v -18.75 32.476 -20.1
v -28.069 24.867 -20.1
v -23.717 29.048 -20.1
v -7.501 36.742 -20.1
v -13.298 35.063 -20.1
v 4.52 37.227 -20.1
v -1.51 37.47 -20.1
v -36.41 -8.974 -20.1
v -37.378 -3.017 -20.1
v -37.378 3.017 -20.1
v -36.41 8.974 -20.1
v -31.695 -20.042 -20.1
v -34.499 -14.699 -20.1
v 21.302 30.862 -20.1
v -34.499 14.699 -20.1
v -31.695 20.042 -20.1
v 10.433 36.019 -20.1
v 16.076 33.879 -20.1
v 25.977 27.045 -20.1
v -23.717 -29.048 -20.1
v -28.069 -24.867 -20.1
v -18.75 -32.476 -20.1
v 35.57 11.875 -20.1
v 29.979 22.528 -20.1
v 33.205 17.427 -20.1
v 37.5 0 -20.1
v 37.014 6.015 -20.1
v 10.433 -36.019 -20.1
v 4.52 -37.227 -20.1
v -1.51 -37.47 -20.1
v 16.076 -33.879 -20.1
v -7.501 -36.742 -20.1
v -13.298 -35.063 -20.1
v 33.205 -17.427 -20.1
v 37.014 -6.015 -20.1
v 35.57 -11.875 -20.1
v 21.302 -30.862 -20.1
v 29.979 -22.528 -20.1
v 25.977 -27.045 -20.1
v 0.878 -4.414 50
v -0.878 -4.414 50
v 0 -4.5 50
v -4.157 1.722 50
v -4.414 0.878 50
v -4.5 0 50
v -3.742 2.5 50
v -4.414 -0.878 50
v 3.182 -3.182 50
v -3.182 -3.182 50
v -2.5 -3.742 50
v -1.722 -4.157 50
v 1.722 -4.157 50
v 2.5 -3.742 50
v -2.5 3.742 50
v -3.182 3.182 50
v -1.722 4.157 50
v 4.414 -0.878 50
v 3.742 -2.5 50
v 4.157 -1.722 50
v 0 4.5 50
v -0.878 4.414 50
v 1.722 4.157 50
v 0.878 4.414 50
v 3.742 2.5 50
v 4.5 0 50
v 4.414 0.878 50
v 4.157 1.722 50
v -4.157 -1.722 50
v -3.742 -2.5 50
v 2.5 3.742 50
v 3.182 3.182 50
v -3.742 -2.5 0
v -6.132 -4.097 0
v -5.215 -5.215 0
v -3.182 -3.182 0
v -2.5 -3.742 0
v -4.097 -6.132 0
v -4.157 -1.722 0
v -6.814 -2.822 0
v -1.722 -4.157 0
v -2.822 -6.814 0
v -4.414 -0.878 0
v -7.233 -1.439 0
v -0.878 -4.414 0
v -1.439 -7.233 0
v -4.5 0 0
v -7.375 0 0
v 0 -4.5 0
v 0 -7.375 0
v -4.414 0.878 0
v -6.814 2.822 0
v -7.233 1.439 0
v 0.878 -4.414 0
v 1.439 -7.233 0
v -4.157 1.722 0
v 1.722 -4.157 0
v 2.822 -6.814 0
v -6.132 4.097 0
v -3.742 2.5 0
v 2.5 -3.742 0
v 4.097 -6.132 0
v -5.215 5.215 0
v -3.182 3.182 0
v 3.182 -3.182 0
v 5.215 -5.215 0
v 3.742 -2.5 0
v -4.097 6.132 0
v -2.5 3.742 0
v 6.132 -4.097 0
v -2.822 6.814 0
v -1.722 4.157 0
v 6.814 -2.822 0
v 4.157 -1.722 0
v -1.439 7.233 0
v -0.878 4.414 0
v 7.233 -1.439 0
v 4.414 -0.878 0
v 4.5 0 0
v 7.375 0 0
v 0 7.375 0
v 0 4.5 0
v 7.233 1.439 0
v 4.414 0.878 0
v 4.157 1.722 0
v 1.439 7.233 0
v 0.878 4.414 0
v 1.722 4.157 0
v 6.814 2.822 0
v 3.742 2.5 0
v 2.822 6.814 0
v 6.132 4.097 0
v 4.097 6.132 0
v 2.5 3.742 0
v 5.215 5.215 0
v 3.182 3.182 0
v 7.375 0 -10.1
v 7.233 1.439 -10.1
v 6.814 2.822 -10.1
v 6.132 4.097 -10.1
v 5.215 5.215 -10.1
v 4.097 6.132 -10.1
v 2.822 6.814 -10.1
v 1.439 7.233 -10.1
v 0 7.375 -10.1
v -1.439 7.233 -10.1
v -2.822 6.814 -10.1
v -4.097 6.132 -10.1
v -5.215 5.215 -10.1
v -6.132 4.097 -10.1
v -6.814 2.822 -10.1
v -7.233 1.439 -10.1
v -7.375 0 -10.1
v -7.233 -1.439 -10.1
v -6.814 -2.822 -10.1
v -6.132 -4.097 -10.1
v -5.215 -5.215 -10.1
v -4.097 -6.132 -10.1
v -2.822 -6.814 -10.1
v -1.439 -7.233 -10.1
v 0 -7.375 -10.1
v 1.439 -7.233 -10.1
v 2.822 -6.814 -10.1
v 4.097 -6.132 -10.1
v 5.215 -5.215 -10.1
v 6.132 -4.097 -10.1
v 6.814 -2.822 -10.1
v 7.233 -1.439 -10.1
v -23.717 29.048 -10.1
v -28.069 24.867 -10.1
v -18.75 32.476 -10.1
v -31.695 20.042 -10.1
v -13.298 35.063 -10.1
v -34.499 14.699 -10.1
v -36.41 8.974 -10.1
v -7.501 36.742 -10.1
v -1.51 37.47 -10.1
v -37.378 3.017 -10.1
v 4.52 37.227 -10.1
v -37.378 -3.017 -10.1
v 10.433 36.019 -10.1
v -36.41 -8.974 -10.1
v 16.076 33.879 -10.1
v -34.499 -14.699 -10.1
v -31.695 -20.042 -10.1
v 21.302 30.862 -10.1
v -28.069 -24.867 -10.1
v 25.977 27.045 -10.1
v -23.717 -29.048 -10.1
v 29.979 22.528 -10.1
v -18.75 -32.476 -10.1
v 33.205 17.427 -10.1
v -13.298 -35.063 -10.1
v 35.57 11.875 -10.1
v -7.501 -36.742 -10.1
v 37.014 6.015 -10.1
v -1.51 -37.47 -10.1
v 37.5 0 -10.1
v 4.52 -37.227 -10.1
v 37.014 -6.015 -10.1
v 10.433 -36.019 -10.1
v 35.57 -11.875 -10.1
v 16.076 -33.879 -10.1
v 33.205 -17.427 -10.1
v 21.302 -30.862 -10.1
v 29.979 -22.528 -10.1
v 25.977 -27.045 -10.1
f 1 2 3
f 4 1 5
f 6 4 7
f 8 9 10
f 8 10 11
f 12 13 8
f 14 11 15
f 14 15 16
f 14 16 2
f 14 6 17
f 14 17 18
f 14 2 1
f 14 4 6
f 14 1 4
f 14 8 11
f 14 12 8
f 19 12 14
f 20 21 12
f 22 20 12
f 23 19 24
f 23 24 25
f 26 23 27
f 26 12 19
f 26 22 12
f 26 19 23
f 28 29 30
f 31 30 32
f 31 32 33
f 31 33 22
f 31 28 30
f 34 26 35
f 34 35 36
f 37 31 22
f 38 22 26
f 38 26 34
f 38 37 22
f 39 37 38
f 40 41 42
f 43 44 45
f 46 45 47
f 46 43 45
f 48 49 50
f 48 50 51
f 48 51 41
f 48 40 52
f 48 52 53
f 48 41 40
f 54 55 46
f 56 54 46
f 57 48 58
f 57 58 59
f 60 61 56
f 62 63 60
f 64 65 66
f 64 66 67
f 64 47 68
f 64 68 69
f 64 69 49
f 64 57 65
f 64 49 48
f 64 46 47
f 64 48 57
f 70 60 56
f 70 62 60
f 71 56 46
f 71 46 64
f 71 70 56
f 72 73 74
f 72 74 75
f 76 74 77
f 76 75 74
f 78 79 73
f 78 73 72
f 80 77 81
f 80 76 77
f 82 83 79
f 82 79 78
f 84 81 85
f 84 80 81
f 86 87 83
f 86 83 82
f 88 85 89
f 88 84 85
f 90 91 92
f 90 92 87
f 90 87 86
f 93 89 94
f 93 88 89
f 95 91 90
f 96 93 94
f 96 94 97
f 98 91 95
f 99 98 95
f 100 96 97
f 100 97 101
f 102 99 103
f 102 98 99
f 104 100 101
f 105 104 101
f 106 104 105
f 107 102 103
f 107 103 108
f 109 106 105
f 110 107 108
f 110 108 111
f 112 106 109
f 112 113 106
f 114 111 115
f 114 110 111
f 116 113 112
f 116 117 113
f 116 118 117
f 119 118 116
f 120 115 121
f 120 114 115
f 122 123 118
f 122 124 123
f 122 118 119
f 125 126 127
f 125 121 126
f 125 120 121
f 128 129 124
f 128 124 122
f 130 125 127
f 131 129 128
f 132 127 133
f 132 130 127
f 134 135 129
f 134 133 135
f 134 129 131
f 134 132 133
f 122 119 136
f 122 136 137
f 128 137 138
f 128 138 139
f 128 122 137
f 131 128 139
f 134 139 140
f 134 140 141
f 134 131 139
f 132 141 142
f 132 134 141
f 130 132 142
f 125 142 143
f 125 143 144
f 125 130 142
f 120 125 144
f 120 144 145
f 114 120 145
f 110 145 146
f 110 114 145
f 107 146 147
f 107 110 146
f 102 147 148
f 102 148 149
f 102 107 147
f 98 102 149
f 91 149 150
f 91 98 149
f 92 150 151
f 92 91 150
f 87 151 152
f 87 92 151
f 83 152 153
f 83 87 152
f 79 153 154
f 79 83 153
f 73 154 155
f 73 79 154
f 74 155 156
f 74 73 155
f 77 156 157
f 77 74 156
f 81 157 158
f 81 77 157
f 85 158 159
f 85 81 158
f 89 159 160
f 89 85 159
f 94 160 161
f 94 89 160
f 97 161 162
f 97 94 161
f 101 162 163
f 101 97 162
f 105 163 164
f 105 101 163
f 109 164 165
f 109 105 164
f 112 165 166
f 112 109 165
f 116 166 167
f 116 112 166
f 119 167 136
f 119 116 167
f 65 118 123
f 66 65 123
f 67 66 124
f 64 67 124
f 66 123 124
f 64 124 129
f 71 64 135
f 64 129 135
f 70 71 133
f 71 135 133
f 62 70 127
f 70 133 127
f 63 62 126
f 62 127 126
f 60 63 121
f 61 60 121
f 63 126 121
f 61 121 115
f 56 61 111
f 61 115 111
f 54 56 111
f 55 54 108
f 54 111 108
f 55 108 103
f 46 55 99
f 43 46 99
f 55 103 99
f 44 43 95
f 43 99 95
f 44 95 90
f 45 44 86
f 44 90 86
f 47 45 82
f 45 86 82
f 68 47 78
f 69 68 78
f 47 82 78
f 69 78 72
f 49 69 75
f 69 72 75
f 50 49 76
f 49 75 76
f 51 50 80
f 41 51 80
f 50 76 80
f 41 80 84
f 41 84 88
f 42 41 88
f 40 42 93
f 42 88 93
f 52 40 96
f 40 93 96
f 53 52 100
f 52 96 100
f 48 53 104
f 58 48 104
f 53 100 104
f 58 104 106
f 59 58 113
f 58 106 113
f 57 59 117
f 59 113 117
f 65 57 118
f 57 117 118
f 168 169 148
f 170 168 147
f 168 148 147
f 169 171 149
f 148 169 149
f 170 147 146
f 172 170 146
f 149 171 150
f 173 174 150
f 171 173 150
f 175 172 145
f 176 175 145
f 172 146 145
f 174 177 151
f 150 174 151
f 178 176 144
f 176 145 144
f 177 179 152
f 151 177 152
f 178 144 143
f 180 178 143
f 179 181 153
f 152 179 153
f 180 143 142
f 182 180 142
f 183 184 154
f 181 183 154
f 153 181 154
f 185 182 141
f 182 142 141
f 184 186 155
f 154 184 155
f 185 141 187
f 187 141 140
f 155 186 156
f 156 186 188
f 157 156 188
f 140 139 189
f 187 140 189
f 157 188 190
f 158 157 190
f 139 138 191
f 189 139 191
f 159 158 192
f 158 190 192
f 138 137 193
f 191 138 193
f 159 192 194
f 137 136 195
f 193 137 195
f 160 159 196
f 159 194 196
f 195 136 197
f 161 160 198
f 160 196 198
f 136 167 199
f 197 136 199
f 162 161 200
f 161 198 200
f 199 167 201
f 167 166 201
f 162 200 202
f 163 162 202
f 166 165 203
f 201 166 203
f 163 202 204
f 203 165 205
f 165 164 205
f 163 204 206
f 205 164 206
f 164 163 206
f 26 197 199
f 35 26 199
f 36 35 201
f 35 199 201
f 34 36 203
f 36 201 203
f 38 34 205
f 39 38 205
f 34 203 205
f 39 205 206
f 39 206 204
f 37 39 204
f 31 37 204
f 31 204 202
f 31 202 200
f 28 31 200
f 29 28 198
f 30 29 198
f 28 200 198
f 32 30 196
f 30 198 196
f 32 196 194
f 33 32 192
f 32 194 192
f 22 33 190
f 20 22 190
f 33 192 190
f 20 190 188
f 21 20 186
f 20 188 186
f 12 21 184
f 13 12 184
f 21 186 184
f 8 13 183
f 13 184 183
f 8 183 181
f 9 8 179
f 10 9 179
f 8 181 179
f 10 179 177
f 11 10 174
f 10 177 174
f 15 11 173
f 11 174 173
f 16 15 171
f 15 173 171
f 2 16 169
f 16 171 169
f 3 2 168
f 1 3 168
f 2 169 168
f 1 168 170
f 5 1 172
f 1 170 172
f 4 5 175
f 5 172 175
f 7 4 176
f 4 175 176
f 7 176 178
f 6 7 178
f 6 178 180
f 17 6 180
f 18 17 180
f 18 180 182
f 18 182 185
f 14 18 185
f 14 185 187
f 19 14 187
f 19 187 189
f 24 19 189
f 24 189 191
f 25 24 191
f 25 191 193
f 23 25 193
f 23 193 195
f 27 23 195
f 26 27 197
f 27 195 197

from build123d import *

# Parameters (mm, degrees)
F0_R     = 4.5
F1_DEPTH = 50
F2_R     = 7.375
F3_DEPTH = 10.1
F4_R     = 37.5
F5_DEPTH = 10


with BuildPart() as f1:
    # F0 (on Top) → F1 (new body)
    with BuildSketch(Plane.XY):
        Circle(F0_R)
    extrude(amount=F1_DEPTH)

    # F2 (on Top) → F3 (join)
    with BuildSketch(Plane.XY):
        Circle(F2_R)
    extrude(amount=-F3_DEPTH)

    # F4 (on face) → F5 (join)
    with BuildSketch(Plane(origin=(0, 0, -10.1), x_dir=(1, 0, 0), z_dir=(0, 0, -1))):
        Circle(F4_R)
    extrude(amount=F5_DEPTH)


solid = f1.part
